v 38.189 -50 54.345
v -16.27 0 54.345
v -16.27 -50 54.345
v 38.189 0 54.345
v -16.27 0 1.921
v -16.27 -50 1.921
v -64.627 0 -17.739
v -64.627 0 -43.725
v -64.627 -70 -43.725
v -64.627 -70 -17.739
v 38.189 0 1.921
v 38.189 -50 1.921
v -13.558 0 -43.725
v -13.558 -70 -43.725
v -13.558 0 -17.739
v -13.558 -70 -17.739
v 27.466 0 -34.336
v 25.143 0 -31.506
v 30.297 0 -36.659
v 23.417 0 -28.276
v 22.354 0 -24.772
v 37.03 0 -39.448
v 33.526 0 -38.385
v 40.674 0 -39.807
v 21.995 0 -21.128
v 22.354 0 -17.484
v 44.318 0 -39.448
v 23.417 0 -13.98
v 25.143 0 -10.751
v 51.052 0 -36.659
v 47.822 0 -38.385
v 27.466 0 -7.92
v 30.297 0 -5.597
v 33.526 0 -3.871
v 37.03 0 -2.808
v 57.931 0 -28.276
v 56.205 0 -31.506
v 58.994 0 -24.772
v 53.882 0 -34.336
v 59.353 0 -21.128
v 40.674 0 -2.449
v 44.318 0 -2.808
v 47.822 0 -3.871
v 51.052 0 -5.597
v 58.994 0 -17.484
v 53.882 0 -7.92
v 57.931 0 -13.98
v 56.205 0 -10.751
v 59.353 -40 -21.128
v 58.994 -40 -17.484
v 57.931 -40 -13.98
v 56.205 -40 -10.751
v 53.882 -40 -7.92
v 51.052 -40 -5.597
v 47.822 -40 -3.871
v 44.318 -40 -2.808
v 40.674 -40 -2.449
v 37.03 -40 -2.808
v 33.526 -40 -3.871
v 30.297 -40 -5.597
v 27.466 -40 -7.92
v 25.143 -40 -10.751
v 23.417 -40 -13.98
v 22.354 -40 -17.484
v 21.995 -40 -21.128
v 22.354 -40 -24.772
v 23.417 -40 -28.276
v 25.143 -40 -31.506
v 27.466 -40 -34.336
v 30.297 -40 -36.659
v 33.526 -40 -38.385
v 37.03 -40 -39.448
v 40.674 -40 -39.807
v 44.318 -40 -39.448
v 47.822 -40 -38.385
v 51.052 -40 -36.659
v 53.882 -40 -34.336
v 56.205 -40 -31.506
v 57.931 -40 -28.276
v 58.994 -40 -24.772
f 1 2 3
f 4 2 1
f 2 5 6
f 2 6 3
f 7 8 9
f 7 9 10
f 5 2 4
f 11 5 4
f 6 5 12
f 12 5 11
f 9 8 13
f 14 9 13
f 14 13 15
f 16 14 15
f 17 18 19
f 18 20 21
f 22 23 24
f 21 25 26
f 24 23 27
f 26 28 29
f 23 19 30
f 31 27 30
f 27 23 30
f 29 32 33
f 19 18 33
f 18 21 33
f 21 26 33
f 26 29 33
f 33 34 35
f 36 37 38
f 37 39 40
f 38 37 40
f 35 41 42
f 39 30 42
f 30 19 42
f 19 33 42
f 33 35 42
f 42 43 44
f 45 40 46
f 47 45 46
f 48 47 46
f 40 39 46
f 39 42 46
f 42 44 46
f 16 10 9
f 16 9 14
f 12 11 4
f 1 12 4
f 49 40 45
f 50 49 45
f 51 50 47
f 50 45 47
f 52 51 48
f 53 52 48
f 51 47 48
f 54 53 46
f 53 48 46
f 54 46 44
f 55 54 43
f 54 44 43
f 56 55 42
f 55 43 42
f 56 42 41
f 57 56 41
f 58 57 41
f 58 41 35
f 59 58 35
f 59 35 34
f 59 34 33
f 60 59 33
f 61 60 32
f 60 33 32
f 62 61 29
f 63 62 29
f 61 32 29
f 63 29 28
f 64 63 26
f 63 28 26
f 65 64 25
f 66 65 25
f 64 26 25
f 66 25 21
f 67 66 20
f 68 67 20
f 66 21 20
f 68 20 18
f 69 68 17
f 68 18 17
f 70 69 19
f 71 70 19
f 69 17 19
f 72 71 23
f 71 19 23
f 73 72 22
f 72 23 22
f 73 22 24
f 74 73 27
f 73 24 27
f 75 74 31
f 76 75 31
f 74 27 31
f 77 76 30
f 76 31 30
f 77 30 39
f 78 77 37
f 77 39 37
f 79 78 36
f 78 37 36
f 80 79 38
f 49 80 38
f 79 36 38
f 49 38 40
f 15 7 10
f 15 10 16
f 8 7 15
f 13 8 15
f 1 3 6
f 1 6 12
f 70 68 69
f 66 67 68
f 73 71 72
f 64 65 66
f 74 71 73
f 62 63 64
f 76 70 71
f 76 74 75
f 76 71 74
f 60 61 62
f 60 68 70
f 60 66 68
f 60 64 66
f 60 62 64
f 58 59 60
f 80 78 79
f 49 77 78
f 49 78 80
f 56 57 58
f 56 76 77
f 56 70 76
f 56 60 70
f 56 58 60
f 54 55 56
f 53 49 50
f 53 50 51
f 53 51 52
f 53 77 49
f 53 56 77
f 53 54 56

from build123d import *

# Parameters (mm, degrees)
F0_W     = 54.458399
F0_H     = 52.424678
F1_DEPTH = 50
F2_W     = 51.068871
F2_H     = 25.986372
F3_DEPTH = 70
F4_R     = 18.678996
F5_DEPTH = 40


with BuildPart() as f1:
    # F0 (on Front) → F1 (new body)
    with BuildSketch(Plane.XZ):
        with Locations((10.95947, 28.133071)):
            Rectangle(F0_W, F0_H)
    extrude(amount=F1_DEPTH)


with BuildPart() as f3:
    # F2 (on Front) → F3 (new body)
    with BuildSketch(Plane.XZ):
        with Locations((-39.092541, -30.731709)):
            Rectangle(F2_W, F2_H)
    extrude(amount=F3_DEPTH)


with BuildPart() as f5:
    # F4 (on Front) → F5 (new body)
    with BuildSketch(Plane.XZ):
        with Locations((40.674321, -21.128051)):
            Circle(F4_R)
    extrude(amount=F5_DEPTH)


solid = Compound([f1.part, f3.part, f5.part])
